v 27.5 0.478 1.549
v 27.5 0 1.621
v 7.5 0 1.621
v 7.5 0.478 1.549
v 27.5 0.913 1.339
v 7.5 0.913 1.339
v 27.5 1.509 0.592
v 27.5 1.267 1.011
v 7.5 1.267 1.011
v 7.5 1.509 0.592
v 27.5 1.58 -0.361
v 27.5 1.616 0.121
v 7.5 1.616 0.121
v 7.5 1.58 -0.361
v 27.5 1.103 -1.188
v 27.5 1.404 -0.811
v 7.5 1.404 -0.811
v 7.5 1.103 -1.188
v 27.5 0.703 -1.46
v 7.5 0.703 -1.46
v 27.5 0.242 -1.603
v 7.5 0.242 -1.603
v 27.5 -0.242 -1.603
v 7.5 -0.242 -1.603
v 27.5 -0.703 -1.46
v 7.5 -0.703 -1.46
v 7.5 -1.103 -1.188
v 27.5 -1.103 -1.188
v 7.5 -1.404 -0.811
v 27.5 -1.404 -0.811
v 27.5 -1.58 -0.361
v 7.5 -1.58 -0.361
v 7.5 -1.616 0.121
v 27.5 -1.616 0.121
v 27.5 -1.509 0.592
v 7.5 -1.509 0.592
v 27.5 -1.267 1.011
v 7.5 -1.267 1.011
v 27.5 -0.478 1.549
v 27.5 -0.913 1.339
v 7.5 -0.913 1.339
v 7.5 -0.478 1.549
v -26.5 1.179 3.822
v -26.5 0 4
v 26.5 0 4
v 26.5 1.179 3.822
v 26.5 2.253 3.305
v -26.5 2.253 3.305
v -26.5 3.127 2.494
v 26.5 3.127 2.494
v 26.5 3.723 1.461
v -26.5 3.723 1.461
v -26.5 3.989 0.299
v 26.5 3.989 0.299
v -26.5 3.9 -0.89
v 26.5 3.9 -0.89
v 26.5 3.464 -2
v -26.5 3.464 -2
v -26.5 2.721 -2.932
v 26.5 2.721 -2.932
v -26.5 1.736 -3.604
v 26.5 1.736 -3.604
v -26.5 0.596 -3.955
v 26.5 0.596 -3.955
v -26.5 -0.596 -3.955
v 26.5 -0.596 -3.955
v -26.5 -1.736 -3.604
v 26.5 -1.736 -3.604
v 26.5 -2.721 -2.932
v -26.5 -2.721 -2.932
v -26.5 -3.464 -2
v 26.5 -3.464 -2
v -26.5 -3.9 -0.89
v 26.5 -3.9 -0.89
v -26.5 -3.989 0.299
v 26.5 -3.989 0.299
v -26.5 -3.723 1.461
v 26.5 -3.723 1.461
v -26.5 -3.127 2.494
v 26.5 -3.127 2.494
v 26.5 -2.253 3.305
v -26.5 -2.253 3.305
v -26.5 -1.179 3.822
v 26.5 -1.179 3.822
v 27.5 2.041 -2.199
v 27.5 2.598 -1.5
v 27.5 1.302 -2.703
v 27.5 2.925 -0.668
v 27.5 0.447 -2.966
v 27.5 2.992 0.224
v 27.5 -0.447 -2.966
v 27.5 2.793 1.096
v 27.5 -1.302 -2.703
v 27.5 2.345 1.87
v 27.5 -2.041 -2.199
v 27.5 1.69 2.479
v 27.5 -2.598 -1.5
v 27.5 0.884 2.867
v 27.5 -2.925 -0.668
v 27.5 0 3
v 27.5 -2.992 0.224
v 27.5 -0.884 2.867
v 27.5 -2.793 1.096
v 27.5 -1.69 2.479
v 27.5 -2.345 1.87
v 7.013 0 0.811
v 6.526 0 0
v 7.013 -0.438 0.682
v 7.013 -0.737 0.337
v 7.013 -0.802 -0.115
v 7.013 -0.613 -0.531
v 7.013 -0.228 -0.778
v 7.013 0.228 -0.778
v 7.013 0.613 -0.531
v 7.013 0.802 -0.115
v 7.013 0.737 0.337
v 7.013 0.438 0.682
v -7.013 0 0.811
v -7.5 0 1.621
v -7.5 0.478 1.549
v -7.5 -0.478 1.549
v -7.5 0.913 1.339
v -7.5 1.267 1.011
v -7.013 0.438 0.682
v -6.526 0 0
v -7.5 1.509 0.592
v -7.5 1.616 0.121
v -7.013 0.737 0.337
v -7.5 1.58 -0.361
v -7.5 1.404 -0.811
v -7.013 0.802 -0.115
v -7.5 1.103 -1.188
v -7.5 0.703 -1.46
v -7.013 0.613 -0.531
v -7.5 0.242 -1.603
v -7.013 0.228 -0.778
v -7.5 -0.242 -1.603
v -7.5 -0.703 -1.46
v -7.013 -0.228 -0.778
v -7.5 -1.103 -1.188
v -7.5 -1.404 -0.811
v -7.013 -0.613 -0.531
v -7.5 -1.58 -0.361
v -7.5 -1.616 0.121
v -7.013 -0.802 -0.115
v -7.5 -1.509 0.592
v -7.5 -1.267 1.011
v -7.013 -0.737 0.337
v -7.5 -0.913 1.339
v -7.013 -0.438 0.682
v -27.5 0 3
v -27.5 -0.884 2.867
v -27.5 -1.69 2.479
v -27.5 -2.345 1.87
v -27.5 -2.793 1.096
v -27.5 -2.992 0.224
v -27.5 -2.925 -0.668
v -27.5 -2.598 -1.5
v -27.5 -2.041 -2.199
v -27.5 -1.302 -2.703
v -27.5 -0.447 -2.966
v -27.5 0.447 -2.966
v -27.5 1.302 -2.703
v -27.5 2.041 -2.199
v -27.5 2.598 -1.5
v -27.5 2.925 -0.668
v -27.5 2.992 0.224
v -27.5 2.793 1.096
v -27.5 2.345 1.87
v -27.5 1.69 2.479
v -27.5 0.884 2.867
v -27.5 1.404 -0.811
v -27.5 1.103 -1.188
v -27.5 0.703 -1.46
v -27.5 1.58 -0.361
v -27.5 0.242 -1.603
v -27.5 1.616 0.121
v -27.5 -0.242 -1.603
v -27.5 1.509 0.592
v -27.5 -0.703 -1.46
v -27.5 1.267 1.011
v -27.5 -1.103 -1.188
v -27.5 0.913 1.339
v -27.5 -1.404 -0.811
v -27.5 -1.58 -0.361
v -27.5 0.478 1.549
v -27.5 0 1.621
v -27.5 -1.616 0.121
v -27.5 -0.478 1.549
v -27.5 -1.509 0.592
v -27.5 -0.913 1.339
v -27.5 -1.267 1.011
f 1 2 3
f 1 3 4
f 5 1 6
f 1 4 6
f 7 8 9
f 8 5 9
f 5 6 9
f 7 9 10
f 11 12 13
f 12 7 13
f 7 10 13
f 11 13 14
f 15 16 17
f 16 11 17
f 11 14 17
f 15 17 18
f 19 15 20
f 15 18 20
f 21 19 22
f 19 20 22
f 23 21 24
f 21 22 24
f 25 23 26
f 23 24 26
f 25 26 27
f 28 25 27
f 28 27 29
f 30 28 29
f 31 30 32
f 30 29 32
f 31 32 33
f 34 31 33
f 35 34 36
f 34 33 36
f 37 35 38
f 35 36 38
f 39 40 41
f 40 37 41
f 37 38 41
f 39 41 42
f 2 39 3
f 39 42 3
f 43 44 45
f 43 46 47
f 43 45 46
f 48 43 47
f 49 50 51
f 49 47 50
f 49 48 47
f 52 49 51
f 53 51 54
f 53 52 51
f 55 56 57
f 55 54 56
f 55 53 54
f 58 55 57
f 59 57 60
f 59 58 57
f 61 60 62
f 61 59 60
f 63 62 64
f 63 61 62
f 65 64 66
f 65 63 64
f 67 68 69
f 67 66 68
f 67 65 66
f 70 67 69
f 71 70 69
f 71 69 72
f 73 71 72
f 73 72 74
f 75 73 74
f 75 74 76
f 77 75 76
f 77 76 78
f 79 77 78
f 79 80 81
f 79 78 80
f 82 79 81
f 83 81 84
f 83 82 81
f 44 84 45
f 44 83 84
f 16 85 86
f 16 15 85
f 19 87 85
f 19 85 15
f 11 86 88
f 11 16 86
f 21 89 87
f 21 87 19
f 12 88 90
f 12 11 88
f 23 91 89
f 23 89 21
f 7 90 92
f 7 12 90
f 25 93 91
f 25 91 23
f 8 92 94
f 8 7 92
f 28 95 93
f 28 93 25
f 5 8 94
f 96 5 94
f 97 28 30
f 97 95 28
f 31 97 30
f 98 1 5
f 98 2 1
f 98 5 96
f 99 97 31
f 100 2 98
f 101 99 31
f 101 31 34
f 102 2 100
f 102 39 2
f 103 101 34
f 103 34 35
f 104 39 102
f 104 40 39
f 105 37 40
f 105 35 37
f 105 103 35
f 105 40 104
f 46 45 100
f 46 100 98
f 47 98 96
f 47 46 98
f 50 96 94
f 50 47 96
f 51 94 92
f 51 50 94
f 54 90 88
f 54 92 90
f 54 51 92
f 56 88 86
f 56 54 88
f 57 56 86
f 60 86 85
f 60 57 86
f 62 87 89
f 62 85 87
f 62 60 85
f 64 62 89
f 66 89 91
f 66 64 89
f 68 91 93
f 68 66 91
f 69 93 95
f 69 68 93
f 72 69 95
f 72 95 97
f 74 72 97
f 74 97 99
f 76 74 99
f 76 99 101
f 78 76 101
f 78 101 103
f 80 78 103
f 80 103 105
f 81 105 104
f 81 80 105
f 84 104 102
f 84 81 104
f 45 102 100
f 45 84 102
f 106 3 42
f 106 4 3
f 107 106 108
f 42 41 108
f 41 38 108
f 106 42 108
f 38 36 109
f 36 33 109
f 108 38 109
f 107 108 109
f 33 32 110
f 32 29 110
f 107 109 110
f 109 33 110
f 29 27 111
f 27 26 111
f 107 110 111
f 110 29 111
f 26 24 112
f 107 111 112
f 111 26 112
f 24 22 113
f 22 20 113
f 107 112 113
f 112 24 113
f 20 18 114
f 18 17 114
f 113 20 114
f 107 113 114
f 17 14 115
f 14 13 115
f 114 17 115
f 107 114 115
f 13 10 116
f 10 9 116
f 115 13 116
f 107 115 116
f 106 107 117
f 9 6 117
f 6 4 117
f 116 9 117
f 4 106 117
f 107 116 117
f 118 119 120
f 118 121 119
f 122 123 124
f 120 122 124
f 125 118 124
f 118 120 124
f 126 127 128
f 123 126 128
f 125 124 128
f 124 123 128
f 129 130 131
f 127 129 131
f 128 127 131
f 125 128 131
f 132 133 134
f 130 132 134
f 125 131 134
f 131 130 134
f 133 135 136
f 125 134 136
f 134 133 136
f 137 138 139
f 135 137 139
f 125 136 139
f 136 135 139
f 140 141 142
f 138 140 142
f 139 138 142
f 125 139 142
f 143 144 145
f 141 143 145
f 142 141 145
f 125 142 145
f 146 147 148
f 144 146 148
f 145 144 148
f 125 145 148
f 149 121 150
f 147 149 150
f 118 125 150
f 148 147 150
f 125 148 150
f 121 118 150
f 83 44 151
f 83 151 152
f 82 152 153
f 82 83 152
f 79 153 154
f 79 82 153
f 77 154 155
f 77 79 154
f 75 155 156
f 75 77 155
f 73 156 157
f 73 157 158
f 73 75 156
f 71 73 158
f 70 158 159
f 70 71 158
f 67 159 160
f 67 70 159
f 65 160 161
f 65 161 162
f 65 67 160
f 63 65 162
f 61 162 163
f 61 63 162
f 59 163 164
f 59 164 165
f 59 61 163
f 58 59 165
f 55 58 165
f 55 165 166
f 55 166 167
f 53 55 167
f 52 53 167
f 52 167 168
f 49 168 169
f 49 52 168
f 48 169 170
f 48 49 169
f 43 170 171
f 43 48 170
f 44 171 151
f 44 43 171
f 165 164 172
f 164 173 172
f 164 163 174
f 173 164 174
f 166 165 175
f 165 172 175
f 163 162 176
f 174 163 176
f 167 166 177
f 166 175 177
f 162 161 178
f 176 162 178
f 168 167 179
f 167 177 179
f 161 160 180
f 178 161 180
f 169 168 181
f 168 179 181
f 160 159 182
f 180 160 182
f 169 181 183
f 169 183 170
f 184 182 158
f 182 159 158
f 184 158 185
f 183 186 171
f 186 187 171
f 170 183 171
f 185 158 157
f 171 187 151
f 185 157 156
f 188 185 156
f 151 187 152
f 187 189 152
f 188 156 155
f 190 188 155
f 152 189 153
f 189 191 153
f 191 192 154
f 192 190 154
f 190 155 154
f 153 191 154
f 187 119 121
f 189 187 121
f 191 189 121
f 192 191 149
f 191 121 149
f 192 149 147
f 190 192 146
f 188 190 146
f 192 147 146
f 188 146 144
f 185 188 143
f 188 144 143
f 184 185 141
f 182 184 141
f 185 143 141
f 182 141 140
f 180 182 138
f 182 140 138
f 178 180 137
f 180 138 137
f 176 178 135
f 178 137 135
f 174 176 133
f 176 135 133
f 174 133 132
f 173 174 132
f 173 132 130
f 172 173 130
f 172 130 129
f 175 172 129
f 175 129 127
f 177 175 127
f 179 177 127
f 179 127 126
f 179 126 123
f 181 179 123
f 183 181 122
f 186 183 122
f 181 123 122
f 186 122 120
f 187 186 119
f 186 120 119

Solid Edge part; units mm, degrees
sketch "Sketch1" plane through (0, 0, 0) normal (0, -1, 0) x (1, 0, 0)
  line L0 (27.5, 0) -> (27.5, 4)
  line L1 (27.5, 4) -> (-27.5, 4)
  line L2 (-27.5, 4) -> (-27.5, 0)
  dimension "D1" = 55
revolve "RevolvedProtrusion1" add sketch "Sketch1" angle 360 about axis through (-32.5, 0, 0) along (1, 0, 0)
chamfer "Chamfer1" distance 1 angle 45 2 edges at (27.5, 0, -4) (-27.5, 0, -4)
hole "Hole_1" at (-27.5, 0, 0) direction (1, 0, 0) diameter 3.242 depth 20 tip angle 118 thread major 4 thread length 15
mirror "Mirror1" about plane through (0, 0, 0) normal (1, 0, 0) of "Hole_1"
properties material "AlSi7Mg"
